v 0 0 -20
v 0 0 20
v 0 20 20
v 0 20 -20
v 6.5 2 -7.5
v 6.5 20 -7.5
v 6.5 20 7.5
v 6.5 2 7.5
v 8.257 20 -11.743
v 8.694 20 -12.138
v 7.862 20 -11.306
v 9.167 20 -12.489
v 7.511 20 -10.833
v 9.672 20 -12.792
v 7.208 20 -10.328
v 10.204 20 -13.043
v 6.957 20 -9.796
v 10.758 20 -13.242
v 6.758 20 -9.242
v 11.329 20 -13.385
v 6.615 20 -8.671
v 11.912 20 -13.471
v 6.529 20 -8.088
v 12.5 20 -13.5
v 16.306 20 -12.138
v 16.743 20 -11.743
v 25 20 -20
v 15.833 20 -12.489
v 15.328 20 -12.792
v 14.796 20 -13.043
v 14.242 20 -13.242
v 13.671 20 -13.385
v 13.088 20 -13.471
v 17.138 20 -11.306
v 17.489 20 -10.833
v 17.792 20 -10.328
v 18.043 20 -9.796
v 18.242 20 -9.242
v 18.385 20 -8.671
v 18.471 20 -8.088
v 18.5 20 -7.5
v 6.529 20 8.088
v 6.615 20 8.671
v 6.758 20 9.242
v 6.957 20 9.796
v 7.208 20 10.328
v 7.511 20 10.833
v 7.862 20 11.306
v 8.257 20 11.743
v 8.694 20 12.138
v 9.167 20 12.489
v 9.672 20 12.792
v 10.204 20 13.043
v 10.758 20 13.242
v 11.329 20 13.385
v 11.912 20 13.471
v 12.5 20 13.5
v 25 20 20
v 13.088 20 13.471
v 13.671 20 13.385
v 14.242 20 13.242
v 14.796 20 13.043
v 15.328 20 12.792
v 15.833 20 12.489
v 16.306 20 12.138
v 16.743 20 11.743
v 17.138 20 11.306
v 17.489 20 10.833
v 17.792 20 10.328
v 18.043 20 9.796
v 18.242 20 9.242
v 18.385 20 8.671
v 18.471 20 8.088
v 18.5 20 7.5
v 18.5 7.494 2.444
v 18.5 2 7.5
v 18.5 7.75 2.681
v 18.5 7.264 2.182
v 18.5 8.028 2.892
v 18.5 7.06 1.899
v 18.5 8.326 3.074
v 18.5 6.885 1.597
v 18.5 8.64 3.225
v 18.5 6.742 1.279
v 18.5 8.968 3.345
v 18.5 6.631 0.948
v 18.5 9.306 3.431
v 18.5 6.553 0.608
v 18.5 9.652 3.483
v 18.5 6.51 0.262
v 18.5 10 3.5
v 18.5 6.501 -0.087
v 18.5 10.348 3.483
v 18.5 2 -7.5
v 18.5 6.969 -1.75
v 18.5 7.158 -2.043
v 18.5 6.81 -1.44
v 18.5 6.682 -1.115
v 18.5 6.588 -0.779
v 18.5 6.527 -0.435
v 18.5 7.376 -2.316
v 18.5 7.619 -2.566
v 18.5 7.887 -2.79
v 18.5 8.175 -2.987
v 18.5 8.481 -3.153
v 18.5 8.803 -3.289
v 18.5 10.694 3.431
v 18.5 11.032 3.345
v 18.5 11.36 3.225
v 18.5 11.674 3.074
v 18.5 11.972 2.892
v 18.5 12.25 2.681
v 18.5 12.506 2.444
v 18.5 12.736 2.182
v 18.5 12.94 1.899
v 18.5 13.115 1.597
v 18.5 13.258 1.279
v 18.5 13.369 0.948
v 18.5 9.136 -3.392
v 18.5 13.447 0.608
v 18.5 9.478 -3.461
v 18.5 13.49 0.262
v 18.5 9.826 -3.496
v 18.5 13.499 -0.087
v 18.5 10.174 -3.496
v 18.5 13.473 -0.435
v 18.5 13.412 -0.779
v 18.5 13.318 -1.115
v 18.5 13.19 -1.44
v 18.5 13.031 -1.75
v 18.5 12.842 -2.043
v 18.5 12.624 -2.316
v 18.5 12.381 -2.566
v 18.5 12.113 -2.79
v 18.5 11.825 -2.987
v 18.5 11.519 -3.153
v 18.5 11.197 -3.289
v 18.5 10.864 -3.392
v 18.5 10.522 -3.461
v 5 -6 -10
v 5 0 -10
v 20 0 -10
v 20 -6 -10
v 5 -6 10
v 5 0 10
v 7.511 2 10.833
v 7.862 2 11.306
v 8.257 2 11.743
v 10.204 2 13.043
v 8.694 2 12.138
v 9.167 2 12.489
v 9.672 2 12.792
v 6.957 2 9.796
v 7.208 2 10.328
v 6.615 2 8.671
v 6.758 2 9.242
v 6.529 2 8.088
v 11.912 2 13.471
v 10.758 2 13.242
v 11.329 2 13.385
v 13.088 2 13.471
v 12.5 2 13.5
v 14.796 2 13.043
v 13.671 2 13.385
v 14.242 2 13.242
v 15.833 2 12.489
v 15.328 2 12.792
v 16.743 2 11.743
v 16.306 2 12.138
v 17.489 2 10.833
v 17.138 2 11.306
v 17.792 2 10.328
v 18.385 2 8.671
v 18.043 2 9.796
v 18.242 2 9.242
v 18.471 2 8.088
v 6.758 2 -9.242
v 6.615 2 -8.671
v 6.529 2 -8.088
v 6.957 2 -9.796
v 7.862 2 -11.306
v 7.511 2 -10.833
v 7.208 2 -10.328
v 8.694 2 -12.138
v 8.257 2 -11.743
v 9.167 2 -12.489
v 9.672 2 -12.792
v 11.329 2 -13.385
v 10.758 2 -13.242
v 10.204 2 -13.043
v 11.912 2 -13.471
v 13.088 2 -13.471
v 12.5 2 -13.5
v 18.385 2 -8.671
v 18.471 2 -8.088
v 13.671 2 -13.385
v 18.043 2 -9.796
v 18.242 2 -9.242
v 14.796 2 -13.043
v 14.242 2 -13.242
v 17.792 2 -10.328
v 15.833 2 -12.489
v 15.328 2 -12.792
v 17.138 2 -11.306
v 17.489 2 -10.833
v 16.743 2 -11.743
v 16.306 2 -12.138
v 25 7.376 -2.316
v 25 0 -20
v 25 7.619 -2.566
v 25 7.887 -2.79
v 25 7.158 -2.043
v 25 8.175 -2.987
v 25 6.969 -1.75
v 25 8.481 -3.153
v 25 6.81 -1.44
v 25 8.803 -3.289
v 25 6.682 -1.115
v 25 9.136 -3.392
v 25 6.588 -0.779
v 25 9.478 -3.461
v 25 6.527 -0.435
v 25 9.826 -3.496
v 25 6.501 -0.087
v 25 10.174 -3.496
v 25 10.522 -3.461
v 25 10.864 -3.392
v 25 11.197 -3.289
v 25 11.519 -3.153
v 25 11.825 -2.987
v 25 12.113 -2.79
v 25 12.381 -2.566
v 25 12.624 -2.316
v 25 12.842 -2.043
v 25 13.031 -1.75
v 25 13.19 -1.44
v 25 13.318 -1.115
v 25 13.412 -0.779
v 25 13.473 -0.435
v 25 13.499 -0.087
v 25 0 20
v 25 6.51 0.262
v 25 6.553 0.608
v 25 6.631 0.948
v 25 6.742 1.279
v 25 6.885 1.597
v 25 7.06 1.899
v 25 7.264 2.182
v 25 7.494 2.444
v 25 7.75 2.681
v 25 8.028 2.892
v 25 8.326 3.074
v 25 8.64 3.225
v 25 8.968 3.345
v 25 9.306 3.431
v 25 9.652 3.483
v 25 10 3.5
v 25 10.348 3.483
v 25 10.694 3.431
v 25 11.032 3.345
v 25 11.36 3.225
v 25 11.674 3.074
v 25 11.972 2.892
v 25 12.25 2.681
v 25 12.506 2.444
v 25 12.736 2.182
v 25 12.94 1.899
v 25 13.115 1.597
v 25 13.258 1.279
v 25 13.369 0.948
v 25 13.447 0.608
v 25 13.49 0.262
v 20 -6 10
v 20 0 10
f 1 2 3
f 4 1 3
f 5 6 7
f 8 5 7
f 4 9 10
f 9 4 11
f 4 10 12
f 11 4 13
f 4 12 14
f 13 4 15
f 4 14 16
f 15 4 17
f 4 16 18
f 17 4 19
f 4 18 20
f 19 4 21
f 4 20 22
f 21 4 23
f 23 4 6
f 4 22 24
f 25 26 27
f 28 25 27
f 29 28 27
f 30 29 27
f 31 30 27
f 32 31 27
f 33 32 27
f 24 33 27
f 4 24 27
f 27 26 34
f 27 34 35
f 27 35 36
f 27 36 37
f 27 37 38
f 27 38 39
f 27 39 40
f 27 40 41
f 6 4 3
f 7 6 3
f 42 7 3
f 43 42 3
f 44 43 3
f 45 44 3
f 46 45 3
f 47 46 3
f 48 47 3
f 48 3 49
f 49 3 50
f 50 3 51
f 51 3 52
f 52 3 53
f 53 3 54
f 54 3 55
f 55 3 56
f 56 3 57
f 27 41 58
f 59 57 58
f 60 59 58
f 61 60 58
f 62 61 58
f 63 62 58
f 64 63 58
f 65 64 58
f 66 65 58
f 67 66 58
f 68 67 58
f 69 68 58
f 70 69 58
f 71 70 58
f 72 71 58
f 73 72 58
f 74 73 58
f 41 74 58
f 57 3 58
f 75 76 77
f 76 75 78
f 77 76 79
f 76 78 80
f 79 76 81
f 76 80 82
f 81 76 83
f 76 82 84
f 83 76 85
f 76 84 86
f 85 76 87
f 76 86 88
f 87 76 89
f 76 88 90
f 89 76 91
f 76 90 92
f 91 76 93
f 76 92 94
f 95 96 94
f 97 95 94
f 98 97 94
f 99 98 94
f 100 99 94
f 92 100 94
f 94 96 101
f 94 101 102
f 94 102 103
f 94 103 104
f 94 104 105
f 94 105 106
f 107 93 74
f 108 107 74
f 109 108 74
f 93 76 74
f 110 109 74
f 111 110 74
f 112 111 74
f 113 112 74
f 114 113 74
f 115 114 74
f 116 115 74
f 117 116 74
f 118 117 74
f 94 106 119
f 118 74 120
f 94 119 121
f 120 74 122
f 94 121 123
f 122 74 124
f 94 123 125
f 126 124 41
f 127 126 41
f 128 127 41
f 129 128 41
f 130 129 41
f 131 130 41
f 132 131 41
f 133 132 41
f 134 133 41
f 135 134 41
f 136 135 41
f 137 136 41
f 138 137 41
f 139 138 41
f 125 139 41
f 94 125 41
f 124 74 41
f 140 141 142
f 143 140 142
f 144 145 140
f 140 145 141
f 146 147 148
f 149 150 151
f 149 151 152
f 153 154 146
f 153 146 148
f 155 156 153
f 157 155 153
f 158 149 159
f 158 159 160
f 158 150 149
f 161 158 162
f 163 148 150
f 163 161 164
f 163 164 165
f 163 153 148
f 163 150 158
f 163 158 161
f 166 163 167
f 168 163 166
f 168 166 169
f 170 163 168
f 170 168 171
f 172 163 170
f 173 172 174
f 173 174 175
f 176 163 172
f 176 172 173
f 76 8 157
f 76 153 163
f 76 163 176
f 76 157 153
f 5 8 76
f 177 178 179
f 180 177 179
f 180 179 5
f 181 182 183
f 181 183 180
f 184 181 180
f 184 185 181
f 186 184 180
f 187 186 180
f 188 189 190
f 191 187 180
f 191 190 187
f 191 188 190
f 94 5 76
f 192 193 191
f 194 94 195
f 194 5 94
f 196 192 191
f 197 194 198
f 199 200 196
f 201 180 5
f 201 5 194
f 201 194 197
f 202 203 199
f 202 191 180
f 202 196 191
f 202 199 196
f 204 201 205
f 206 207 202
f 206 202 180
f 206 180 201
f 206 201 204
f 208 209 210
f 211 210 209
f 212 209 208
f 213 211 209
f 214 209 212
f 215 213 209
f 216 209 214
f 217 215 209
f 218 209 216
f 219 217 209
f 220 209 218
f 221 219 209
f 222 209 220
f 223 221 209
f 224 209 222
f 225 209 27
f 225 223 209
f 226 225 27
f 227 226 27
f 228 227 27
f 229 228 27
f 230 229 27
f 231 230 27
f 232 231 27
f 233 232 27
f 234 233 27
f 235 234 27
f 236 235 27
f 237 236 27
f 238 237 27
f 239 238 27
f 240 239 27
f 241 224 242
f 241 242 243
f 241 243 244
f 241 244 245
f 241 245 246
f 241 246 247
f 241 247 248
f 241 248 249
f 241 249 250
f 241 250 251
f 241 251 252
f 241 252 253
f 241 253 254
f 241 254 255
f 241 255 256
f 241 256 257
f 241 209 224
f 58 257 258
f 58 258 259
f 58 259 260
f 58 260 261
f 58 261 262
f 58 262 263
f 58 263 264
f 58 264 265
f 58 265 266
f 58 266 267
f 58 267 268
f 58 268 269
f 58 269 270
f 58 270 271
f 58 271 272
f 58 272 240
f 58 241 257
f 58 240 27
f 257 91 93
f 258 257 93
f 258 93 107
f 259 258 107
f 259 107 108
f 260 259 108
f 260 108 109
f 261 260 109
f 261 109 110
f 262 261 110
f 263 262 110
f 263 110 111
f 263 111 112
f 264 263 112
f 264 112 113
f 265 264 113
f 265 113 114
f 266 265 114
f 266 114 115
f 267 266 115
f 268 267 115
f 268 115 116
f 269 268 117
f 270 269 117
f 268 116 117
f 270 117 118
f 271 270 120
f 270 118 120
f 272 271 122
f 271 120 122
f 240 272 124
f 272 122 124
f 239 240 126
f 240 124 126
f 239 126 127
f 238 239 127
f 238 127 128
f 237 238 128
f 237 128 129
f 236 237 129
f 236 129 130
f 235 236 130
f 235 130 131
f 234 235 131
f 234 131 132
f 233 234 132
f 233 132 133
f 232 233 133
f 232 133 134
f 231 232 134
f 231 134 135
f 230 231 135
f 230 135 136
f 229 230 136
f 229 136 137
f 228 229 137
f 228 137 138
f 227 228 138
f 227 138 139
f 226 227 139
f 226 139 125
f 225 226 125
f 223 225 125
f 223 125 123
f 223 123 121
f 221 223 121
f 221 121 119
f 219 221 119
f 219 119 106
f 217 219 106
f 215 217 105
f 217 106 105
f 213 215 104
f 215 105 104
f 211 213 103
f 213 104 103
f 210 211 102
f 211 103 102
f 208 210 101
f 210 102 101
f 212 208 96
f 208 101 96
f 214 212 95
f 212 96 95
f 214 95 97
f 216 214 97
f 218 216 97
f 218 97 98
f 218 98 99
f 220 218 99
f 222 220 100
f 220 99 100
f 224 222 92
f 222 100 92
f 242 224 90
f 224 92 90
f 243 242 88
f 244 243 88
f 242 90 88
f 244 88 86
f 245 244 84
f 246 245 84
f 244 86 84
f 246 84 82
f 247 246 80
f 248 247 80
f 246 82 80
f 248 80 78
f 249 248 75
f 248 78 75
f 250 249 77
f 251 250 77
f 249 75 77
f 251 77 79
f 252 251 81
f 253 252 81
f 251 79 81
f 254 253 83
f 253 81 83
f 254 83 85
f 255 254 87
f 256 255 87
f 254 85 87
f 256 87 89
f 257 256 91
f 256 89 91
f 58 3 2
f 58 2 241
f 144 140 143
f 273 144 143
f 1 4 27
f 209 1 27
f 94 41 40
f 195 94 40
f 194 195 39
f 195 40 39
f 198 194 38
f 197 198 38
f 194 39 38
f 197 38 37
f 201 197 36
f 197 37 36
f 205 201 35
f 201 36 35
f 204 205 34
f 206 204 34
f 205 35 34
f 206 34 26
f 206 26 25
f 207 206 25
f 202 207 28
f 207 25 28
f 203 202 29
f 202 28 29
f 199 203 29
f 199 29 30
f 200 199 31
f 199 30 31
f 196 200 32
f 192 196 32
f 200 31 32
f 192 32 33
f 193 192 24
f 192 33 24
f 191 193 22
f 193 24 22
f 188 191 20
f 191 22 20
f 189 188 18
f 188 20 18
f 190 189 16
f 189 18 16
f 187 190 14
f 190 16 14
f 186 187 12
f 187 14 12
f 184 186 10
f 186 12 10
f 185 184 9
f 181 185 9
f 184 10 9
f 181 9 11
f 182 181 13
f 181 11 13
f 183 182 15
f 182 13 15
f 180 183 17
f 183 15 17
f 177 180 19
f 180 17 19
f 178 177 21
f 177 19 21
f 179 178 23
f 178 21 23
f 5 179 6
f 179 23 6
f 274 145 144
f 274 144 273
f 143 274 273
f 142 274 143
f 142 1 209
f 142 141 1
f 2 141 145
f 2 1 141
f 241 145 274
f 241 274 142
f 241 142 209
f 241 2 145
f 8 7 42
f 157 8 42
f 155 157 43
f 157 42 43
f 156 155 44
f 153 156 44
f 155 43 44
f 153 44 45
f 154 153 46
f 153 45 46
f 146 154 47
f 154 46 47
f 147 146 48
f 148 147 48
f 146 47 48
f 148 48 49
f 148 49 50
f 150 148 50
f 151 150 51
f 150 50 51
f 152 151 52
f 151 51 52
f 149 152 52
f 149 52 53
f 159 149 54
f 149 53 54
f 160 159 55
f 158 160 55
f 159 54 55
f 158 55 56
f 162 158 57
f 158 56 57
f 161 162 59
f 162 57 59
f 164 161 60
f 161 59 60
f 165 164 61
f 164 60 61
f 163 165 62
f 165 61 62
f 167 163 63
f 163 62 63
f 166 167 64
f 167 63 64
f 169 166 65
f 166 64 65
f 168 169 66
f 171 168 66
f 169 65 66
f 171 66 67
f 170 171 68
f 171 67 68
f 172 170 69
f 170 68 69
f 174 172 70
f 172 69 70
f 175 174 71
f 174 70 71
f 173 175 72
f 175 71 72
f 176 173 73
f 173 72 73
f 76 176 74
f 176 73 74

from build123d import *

# Parameters (mm, degrees)
SKETCH1_W           = 25
SKETCH1_H           = 20
BOSS_EXTRUDE1_DEPTH = 20
CUT_EXTRUDE1_DEPTH  = 18
HOLE1_D             = 7
HOLE1_DEPTH         = 6.5
SKETCH6_W           = 15
SKETCH6_H           = 20
BOSS_EXTRUDE2_DEPTH = 6


with BuildPart() as part:
    # Sketch1 → Boss-Extrude1 (new body, symmetric)
    with BuildSketch(Plane.XY):
        with Locations((12.5, 10)):
            Rectangle(SKETCH1_W, SKETCH1_H)
    extrude(amount=BOSS_EXTRUDE1_DEPTH, both=True)

    # Sketch2 → Cut-Extrude1 (cut)
    with BuildSketch(Plane(origin=(0, 20, 0), x_dir=(1, 0, 0), z_dir=(0, 1, 0))):
        with BuildLine():
            Line((6.5, 7.5), (6.5, -7.5))
            ThreePointArc((6.5, -7.5), (12.5, -13.5), (18.5, -7.5))
            Line((18.5, -7.5), (18.5, 7.5))
            ThreePointArc((18.5, 7.5), (12.5, 13.5), (6.5, 7.5))
        make_face()
    extrude(amount=-CUT_EXTRUDE1_DEPTH, mode=Mode.SUBTRACT)

    # Hole1
    with Locations(Plane(origin=(25, 0, 0), x_dir=(0, 0, -1), z_dir=(1, 0, 0))):
        with Locations((0, 10)):
            Hole(HOLE1_D / 2, depth=HOLE1_DEPTH)

    # Sketch6 → Boss-Extrude2 (add)
    with BuildSketch(Plane(origin=(0, 0, 0), x_dir=(1, 0, 0), z_dir=(0, 1, 0))):
        with Locations((12.5, 0)):
            Rectangle(SKETCH6_W, SKETCH6_H)
    extrude(amount=-BOSS_EXTRUDE2_DEPTH)


solid = part.part
